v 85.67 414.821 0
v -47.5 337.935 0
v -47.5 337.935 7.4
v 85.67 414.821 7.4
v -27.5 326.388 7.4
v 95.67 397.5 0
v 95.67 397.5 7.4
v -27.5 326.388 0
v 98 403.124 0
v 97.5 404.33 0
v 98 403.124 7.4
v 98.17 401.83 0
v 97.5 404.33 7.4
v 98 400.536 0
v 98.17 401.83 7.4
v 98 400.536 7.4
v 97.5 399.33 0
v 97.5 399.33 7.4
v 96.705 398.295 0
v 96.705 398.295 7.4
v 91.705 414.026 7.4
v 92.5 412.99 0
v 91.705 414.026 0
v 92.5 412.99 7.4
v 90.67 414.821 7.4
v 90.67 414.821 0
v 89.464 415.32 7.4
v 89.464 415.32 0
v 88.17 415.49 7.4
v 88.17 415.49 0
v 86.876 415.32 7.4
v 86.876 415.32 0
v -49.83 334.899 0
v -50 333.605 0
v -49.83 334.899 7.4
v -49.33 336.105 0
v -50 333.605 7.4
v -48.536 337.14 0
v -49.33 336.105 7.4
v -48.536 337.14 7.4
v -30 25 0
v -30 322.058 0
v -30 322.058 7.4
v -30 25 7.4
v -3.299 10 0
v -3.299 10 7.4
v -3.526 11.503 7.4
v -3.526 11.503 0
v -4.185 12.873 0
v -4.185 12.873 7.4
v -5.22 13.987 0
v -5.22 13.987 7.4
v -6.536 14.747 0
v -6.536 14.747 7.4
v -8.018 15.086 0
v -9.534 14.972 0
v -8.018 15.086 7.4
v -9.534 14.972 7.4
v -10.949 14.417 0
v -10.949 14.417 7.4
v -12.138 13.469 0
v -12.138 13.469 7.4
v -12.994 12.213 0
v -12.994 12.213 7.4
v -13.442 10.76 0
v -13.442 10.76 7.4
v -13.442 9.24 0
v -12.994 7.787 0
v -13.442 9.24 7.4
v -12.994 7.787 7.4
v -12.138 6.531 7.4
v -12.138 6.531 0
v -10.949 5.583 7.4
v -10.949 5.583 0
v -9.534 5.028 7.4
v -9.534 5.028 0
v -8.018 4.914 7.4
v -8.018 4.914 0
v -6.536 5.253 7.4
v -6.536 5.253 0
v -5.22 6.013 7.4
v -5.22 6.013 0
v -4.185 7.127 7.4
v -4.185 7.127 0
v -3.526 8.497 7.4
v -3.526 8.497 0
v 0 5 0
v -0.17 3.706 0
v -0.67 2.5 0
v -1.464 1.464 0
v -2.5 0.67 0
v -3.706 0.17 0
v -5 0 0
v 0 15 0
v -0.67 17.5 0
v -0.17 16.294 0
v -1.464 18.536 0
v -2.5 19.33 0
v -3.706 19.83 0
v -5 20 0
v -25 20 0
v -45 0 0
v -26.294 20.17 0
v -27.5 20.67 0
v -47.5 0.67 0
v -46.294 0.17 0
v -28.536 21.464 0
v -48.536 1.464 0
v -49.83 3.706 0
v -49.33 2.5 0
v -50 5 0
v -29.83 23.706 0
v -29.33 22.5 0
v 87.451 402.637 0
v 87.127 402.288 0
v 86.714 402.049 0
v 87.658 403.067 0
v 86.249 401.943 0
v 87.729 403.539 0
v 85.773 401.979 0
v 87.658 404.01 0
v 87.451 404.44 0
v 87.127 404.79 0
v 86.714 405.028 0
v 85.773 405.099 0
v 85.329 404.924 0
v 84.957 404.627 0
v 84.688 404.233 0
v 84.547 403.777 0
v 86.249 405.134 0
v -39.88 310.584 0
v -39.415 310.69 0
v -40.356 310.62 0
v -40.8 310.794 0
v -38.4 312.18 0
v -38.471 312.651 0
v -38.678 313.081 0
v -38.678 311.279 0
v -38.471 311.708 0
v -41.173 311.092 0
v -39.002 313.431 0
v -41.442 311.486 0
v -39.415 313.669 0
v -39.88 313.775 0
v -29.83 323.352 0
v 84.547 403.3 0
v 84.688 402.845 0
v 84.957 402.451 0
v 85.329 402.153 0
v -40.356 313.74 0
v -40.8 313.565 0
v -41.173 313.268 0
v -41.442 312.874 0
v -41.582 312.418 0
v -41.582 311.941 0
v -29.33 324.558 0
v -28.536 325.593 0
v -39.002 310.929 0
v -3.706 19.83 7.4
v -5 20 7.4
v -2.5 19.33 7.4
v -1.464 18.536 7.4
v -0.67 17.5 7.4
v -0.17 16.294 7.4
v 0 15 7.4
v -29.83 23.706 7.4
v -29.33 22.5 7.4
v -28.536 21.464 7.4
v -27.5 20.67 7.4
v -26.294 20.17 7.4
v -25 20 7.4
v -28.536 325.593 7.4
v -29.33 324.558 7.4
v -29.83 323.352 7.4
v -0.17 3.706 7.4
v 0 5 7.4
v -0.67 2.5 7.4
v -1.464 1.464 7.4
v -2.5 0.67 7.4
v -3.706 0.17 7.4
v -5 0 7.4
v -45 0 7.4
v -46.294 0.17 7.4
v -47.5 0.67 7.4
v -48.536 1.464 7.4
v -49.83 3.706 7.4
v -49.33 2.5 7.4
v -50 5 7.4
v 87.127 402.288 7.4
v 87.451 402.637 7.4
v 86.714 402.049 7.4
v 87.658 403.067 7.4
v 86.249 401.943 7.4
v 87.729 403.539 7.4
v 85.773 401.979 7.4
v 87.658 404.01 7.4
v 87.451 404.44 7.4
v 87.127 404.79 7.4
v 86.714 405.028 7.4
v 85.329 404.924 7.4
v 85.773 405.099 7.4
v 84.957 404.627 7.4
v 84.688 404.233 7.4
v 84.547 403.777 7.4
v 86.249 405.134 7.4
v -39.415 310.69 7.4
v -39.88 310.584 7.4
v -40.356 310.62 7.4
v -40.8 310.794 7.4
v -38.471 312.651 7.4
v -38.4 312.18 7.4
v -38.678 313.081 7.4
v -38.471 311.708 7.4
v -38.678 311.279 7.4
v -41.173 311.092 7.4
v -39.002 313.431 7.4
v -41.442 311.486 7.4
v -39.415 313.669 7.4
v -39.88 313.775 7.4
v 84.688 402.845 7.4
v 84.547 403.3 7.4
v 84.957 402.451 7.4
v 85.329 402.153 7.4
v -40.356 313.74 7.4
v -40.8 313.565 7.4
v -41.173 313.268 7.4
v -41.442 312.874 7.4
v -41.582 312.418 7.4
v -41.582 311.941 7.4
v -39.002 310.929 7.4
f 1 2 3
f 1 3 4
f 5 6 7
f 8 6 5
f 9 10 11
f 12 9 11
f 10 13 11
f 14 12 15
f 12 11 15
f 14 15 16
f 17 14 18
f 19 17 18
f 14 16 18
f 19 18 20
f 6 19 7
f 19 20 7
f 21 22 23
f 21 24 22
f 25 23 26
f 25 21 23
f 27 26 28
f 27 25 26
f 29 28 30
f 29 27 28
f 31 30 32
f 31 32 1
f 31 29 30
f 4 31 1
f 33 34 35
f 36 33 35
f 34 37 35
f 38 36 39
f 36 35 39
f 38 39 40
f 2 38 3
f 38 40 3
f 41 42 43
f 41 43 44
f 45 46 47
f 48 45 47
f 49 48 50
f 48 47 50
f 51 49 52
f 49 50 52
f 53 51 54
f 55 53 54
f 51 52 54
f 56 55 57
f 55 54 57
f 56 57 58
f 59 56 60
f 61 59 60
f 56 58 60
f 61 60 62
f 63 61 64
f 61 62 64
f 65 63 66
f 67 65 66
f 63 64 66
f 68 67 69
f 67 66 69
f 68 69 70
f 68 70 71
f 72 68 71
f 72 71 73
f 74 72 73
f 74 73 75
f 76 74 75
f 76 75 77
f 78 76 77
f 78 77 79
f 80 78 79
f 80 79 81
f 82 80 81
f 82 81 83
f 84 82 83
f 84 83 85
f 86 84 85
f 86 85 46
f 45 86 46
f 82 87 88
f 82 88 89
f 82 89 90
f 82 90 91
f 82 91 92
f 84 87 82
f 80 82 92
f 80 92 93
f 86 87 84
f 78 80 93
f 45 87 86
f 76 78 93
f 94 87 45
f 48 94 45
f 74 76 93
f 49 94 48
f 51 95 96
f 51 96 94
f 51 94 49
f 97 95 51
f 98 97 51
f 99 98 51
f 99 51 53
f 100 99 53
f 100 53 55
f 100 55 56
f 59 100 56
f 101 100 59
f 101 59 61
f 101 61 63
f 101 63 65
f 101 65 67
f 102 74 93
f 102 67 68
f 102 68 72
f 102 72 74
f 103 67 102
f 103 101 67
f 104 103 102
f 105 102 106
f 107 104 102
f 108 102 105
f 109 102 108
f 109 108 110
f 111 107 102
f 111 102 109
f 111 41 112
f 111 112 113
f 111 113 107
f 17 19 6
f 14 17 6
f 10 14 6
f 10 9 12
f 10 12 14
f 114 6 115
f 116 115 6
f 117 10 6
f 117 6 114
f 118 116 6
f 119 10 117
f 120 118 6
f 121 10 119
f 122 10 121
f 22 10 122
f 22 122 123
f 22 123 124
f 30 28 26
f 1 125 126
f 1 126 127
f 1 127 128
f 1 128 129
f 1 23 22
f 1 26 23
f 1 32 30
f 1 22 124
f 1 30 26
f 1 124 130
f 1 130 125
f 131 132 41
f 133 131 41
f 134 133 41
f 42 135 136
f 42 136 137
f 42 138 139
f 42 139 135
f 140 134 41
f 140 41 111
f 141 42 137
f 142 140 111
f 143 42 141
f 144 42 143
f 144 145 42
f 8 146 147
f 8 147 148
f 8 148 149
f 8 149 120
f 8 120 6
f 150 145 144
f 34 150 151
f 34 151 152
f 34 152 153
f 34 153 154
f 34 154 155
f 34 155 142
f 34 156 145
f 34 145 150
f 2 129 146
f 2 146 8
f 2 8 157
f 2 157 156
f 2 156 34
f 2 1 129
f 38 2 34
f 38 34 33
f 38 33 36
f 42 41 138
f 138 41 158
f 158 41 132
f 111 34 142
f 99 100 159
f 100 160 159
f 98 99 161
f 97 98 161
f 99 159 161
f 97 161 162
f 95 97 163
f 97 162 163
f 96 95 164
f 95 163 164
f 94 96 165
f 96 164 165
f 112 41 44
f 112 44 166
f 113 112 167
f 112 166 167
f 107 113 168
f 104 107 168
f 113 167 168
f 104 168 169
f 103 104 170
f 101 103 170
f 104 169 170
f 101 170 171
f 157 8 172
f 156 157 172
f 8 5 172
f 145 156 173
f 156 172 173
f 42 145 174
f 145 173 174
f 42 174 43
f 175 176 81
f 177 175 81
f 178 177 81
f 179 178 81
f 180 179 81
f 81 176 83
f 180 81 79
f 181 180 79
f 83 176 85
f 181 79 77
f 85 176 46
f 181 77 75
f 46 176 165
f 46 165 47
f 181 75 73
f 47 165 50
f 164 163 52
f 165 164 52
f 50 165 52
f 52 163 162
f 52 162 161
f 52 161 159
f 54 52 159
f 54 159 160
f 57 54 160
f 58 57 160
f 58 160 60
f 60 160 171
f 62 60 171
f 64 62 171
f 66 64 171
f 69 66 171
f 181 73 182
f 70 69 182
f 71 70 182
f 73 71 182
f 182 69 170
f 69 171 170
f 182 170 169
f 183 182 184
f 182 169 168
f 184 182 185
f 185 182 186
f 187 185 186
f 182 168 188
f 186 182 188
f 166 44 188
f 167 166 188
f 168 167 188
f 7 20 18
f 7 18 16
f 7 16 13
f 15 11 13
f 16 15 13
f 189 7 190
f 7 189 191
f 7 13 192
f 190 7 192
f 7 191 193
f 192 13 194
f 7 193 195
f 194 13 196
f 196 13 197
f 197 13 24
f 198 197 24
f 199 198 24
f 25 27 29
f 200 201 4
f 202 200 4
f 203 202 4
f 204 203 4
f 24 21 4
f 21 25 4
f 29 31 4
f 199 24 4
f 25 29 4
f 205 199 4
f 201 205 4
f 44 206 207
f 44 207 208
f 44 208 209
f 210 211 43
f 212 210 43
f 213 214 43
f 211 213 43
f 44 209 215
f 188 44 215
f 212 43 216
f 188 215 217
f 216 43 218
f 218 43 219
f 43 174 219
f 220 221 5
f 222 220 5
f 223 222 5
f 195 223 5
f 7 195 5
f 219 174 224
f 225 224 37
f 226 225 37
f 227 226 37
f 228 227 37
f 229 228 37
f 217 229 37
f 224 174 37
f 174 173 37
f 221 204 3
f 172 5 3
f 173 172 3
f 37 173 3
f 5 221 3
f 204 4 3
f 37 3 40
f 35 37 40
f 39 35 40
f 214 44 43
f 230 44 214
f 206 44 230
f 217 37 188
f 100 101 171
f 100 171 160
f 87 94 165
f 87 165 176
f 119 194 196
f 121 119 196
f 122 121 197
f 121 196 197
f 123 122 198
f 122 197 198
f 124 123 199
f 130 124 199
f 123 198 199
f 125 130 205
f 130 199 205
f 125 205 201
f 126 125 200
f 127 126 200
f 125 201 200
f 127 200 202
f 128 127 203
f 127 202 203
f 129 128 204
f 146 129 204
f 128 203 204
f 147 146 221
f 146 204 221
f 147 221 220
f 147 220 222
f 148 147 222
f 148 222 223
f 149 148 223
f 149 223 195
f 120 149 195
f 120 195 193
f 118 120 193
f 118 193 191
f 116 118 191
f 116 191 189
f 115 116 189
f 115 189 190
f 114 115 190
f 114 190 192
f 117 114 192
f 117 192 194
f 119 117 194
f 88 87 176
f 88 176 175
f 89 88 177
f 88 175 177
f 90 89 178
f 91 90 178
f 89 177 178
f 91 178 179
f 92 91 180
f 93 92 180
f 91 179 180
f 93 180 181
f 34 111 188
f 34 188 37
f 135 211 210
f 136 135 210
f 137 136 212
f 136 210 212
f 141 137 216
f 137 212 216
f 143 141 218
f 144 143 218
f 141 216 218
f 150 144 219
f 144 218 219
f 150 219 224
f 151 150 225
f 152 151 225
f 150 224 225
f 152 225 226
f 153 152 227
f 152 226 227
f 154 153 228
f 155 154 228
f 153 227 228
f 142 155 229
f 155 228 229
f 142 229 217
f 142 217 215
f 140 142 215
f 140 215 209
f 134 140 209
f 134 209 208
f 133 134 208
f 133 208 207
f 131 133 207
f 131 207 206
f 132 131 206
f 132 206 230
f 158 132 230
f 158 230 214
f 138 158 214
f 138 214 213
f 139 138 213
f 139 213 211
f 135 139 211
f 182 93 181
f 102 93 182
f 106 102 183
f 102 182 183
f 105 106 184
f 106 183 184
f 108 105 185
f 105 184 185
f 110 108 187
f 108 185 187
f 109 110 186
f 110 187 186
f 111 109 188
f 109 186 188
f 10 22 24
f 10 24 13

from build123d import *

# Parameters (mm, degrees)
PAD_DEPTH     = 7.4
FILLET_R      = 5
SKETCH001_R   = 1.6
SKETCH001_R_2 = 5.1
POCKET_DEPTH  = 7.401


with BuildPart() as part:
    # Sketch → Pad (new body)
    with BuildSketch(Plane.XY):
        Polygon((90, 417.320508), (100, 400), (-30, 324.944465), (-30, 20), (0, 20), (0, 0), (-50, 0), (-50, 336.49147), align=None)
    extrude(amount=PAD_DEPTH)

    # Fillet
    fillet_edges = [part.edges().sort_by_distance(p)[0] for p in [
        (0, 0, 3.7),
        (0, 20, 3.7),
        (-50, 0, 3.7),
        (-30, 324.944465, 3.7),
        (100, 400, 3.7),
        (-30, 20, 3.7),
        (90, 417.320508, 3.7),
        (-50, 336.49147, 3.7),
    ]]
    fillet(fillet_edges, radius=FILLET_R)

    # Sketch001 (on Face5 of Fillet) → Pocket (cut, through all)
    with BuildSketch(Plane.XY.offset(7.4)):
        with Locations((86.1294, 403.538811)):
            Circle(SKETCH001_R)
        with Locations((-40, 312.17984)):
            Circle(SKETCH001_R)
        with Locations((-8.399299, 10)):
            Circle(SKETCH001_R_2)
    extrude(amount=-POCKET_DEPTH, mode=Mode.SUBTRACT)


solid = part.part
